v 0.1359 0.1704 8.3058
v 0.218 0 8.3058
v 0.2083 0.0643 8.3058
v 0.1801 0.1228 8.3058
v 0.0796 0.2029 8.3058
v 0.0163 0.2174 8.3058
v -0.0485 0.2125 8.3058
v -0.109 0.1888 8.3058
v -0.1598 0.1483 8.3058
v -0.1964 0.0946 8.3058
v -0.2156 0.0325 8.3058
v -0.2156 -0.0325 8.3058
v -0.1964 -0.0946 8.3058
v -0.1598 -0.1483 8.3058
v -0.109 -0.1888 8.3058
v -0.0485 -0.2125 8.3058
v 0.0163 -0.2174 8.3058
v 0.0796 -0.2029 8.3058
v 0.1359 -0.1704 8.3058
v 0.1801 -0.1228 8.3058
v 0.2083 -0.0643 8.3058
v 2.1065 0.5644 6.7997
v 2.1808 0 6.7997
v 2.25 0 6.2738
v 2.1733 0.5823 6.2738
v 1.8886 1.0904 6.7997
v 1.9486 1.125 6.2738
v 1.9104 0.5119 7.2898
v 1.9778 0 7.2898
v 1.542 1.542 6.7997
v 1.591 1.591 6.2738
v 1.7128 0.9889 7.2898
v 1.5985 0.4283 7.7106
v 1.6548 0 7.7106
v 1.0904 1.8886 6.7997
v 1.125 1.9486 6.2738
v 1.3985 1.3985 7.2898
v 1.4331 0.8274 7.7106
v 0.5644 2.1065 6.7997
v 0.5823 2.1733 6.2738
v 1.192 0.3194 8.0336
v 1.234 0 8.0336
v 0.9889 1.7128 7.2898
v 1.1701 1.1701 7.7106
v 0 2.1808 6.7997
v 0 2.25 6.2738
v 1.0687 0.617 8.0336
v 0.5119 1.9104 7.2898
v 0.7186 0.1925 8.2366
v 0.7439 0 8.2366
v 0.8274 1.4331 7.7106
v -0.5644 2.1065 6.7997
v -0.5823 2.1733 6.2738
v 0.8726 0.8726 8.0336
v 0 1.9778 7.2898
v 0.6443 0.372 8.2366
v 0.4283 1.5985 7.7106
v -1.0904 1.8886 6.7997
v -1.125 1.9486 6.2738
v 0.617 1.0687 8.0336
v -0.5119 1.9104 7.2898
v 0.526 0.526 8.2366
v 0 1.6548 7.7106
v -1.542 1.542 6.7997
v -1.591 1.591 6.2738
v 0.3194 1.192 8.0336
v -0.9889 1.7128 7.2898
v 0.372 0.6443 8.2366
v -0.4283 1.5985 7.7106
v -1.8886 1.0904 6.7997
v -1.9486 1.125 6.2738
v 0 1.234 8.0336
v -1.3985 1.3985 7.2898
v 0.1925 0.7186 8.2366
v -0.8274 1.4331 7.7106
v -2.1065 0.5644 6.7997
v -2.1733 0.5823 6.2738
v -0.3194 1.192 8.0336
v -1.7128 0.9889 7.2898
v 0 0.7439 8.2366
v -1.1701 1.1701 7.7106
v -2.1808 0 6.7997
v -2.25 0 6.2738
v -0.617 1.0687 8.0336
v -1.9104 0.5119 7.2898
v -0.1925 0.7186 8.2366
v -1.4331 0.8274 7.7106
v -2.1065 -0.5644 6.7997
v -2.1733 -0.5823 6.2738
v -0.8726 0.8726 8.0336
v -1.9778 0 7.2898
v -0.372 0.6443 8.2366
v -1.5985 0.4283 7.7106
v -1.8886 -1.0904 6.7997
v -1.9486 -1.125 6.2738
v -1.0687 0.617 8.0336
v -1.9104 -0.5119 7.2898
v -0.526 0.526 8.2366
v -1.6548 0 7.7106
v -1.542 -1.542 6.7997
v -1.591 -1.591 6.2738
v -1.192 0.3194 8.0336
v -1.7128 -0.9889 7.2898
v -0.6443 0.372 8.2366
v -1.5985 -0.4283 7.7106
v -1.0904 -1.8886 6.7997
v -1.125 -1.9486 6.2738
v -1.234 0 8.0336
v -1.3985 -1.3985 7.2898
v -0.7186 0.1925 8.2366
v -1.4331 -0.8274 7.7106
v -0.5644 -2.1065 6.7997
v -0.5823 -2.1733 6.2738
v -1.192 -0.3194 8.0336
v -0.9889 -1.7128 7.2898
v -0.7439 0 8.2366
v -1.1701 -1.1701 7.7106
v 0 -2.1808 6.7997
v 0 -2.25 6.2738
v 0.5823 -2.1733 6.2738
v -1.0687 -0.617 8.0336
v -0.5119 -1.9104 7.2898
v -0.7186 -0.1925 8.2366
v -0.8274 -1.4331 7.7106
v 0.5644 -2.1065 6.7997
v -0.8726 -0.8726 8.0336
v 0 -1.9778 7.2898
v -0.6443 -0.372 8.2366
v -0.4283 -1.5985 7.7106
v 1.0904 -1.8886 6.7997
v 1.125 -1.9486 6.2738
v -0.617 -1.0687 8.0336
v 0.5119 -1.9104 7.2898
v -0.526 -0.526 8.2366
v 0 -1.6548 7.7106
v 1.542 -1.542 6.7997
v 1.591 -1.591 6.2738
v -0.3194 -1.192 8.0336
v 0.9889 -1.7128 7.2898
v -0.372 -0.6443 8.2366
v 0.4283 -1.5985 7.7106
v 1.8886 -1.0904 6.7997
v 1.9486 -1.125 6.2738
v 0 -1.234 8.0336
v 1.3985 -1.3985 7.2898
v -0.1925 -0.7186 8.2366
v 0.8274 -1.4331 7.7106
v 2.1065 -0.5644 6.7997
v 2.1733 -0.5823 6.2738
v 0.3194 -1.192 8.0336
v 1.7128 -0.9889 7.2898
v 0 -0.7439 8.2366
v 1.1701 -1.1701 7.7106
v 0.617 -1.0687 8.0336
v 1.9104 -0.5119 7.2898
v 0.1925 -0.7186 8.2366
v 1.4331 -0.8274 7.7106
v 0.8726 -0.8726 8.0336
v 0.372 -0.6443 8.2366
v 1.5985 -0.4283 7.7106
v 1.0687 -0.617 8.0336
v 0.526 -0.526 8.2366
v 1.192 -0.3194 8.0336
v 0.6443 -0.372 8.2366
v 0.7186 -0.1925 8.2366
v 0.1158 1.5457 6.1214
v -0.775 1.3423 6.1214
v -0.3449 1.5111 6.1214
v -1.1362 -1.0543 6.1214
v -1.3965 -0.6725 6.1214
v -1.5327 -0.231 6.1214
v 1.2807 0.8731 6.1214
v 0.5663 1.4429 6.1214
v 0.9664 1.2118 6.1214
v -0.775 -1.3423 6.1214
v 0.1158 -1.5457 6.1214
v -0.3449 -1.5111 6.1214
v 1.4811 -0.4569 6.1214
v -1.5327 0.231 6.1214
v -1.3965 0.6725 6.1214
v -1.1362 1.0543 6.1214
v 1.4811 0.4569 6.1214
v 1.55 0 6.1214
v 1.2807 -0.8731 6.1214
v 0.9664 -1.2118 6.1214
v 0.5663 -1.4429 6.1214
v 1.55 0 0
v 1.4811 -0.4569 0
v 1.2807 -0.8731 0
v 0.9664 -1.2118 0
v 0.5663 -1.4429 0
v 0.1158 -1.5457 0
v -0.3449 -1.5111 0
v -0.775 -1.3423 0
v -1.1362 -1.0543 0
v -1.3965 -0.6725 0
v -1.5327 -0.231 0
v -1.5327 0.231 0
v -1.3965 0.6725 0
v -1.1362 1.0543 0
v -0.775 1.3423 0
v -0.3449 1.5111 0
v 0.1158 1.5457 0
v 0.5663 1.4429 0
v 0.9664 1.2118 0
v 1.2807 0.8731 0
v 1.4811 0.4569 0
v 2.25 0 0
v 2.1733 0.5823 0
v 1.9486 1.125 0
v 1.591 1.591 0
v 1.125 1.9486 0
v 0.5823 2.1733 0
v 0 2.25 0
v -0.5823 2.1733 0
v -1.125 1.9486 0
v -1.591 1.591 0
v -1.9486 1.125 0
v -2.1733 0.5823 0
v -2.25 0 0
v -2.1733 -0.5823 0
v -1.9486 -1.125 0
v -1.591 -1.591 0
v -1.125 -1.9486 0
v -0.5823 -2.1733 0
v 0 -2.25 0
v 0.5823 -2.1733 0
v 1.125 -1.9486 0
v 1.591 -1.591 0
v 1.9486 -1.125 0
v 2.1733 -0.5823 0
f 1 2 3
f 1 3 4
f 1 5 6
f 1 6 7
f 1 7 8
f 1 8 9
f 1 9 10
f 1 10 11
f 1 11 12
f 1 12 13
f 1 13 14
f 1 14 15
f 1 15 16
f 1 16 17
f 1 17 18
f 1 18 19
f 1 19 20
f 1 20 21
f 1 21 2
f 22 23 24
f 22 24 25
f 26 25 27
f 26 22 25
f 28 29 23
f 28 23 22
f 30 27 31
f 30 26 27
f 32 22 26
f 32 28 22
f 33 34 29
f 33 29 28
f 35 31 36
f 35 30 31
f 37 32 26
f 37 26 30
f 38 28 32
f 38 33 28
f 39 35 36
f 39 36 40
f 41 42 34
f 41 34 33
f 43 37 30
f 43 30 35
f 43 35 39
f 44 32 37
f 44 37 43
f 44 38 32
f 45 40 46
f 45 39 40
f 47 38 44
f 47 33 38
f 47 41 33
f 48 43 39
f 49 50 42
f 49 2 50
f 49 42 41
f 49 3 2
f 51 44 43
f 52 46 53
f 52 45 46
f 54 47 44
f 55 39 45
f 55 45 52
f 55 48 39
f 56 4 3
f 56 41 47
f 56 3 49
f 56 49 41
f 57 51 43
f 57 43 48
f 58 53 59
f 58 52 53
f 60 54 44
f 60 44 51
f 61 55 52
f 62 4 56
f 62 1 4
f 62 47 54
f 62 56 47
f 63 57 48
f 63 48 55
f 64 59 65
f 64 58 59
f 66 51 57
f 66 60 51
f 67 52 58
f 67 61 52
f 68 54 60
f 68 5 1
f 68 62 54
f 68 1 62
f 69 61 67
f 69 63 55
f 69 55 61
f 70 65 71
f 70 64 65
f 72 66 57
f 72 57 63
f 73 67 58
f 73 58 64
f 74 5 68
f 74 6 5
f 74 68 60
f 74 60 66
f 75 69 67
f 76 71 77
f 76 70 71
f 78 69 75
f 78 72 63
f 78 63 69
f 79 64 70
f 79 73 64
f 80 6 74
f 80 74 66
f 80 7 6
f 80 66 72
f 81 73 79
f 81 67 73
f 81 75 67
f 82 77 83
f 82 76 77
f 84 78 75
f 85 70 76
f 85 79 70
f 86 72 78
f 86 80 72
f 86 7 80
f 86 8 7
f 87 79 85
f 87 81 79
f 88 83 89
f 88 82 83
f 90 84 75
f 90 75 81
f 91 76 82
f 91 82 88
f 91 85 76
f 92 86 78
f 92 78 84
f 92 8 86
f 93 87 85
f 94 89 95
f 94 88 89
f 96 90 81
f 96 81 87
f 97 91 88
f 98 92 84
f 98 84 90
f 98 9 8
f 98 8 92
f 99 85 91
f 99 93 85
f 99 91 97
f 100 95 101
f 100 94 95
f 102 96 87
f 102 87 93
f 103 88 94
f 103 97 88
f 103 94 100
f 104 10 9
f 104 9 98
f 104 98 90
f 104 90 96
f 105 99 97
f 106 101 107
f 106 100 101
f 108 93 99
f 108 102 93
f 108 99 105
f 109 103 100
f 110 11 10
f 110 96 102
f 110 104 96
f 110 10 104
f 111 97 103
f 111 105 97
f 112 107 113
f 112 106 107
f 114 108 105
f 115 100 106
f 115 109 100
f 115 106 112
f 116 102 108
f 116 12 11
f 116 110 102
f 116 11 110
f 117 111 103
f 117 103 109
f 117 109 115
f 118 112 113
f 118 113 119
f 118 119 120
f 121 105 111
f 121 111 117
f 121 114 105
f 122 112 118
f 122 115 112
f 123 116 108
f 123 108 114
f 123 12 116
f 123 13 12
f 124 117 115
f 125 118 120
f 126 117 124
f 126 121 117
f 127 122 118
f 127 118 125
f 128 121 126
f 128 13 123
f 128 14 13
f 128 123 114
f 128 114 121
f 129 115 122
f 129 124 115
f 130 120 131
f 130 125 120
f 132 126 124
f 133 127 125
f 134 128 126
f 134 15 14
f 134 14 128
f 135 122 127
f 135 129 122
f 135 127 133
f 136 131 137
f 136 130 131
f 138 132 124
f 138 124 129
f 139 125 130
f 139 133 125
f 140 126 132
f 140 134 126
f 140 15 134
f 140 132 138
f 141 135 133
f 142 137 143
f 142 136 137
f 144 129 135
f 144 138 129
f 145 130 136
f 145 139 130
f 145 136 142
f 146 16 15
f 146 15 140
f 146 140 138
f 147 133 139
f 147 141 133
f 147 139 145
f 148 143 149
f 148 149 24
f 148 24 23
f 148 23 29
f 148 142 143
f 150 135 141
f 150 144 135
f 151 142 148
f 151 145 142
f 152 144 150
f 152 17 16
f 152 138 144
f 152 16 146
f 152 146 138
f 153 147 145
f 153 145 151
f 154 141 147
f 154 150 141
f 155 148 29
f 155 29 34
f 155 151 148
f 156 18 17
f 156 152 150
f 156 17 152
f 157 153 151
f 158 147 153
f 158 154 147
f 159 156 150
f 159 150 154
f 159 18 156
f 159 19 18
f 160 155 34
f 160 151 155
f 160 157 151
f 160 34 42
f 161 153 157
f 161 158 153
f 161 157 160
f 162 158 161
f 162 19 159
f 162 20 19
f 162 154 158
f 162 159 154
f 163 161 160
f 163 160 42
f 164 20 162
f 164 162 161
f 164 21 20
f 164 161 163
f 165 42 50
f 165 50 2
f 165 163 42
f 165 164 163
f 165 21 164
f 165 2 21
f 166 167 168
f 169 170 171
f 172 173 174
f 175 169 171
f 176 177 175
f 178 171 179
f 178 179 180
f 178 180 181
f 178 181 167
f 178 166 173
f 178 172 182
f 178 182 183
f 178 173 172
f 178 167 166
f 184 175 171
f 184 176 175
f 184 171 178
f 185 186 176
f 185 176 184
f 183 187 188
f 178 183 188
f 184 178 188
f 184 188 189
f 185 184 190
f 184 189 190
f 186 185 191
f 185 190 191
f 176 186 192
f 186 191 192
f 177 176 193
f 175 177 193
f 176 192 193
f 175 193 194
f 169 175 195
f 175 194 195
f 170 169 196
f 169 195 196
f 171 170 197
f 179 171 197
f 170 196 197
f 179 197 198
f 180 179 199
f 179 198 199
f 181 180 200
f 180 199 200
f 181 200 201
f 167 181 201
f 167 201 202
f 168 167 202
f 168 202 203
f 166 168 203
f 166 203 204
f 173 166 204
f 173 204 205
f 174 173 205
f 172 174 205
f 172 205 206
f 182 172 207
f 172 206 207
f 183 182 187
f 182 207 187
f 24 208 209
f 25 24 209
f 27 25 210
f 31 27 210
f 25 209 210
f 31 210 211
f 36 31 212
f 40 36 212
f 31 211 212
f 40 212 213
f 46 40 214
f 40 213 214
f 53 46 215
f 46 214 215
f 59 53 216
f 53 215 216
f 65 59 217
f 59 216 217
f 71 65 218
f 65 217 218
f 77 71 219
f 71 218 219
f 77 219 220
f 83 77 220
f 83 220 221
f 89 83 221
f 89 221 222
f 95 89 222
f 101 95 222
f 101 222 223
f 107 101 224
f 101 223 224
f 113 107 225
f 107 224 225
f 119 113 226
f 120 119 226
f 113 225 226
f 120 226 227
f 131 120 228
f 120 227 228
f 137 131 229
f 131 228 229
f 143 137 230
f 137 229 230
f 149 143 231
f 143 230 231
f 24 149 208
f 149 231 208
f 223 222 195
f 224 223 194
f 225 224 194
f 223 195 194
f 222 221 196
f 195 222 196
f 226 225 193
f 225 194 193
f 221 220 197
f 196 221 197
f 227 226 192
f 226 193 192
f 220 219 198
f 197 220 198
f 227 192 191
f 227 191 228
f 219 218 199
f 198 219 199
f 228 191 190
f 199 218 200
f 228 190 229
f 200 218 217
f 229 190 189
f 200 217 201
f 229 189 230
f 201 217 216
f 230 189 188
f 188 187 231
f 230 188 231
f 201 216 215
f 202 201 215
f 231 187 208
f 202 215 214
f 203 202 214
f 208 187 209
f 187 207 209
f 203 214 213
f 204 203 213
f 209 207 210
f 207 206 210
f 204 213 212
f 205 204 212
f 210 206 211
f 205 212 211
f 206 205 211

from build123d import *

# Parameters (mm, degrees)
F0_R     = 2.25
F1_DEPTH = 8.3058
F2_R     = 2.032
F3_R     = 1.55
F4_DEPTH = 6.1214


with BuildPart() as f1:
    # F0 (on Top) → F1 (new body)
    with BuildSketch(Plane.XY):
        Circle(F0_R)
    extrude(amount=F1_DEPTH)

    # F2
    f2_edges = [f1.edges().sort_by_distance(p)[0] for p in [
        (-2.25, 0, 8.3058),
    ]]
    fillet(f2_edges, radius=F2_R)

    # F3 (on face) → F4 (cut)
    with BuildSketch(Plane(origin=(0, 0, 0), x_dir=(1, 0, 0), z_dir=(0, 0, -1))):
        Circle(F3_R)
    extrude(amount=-F4_DEPTH, mode=Mode.SUBTRACT)


solid = f1.part
